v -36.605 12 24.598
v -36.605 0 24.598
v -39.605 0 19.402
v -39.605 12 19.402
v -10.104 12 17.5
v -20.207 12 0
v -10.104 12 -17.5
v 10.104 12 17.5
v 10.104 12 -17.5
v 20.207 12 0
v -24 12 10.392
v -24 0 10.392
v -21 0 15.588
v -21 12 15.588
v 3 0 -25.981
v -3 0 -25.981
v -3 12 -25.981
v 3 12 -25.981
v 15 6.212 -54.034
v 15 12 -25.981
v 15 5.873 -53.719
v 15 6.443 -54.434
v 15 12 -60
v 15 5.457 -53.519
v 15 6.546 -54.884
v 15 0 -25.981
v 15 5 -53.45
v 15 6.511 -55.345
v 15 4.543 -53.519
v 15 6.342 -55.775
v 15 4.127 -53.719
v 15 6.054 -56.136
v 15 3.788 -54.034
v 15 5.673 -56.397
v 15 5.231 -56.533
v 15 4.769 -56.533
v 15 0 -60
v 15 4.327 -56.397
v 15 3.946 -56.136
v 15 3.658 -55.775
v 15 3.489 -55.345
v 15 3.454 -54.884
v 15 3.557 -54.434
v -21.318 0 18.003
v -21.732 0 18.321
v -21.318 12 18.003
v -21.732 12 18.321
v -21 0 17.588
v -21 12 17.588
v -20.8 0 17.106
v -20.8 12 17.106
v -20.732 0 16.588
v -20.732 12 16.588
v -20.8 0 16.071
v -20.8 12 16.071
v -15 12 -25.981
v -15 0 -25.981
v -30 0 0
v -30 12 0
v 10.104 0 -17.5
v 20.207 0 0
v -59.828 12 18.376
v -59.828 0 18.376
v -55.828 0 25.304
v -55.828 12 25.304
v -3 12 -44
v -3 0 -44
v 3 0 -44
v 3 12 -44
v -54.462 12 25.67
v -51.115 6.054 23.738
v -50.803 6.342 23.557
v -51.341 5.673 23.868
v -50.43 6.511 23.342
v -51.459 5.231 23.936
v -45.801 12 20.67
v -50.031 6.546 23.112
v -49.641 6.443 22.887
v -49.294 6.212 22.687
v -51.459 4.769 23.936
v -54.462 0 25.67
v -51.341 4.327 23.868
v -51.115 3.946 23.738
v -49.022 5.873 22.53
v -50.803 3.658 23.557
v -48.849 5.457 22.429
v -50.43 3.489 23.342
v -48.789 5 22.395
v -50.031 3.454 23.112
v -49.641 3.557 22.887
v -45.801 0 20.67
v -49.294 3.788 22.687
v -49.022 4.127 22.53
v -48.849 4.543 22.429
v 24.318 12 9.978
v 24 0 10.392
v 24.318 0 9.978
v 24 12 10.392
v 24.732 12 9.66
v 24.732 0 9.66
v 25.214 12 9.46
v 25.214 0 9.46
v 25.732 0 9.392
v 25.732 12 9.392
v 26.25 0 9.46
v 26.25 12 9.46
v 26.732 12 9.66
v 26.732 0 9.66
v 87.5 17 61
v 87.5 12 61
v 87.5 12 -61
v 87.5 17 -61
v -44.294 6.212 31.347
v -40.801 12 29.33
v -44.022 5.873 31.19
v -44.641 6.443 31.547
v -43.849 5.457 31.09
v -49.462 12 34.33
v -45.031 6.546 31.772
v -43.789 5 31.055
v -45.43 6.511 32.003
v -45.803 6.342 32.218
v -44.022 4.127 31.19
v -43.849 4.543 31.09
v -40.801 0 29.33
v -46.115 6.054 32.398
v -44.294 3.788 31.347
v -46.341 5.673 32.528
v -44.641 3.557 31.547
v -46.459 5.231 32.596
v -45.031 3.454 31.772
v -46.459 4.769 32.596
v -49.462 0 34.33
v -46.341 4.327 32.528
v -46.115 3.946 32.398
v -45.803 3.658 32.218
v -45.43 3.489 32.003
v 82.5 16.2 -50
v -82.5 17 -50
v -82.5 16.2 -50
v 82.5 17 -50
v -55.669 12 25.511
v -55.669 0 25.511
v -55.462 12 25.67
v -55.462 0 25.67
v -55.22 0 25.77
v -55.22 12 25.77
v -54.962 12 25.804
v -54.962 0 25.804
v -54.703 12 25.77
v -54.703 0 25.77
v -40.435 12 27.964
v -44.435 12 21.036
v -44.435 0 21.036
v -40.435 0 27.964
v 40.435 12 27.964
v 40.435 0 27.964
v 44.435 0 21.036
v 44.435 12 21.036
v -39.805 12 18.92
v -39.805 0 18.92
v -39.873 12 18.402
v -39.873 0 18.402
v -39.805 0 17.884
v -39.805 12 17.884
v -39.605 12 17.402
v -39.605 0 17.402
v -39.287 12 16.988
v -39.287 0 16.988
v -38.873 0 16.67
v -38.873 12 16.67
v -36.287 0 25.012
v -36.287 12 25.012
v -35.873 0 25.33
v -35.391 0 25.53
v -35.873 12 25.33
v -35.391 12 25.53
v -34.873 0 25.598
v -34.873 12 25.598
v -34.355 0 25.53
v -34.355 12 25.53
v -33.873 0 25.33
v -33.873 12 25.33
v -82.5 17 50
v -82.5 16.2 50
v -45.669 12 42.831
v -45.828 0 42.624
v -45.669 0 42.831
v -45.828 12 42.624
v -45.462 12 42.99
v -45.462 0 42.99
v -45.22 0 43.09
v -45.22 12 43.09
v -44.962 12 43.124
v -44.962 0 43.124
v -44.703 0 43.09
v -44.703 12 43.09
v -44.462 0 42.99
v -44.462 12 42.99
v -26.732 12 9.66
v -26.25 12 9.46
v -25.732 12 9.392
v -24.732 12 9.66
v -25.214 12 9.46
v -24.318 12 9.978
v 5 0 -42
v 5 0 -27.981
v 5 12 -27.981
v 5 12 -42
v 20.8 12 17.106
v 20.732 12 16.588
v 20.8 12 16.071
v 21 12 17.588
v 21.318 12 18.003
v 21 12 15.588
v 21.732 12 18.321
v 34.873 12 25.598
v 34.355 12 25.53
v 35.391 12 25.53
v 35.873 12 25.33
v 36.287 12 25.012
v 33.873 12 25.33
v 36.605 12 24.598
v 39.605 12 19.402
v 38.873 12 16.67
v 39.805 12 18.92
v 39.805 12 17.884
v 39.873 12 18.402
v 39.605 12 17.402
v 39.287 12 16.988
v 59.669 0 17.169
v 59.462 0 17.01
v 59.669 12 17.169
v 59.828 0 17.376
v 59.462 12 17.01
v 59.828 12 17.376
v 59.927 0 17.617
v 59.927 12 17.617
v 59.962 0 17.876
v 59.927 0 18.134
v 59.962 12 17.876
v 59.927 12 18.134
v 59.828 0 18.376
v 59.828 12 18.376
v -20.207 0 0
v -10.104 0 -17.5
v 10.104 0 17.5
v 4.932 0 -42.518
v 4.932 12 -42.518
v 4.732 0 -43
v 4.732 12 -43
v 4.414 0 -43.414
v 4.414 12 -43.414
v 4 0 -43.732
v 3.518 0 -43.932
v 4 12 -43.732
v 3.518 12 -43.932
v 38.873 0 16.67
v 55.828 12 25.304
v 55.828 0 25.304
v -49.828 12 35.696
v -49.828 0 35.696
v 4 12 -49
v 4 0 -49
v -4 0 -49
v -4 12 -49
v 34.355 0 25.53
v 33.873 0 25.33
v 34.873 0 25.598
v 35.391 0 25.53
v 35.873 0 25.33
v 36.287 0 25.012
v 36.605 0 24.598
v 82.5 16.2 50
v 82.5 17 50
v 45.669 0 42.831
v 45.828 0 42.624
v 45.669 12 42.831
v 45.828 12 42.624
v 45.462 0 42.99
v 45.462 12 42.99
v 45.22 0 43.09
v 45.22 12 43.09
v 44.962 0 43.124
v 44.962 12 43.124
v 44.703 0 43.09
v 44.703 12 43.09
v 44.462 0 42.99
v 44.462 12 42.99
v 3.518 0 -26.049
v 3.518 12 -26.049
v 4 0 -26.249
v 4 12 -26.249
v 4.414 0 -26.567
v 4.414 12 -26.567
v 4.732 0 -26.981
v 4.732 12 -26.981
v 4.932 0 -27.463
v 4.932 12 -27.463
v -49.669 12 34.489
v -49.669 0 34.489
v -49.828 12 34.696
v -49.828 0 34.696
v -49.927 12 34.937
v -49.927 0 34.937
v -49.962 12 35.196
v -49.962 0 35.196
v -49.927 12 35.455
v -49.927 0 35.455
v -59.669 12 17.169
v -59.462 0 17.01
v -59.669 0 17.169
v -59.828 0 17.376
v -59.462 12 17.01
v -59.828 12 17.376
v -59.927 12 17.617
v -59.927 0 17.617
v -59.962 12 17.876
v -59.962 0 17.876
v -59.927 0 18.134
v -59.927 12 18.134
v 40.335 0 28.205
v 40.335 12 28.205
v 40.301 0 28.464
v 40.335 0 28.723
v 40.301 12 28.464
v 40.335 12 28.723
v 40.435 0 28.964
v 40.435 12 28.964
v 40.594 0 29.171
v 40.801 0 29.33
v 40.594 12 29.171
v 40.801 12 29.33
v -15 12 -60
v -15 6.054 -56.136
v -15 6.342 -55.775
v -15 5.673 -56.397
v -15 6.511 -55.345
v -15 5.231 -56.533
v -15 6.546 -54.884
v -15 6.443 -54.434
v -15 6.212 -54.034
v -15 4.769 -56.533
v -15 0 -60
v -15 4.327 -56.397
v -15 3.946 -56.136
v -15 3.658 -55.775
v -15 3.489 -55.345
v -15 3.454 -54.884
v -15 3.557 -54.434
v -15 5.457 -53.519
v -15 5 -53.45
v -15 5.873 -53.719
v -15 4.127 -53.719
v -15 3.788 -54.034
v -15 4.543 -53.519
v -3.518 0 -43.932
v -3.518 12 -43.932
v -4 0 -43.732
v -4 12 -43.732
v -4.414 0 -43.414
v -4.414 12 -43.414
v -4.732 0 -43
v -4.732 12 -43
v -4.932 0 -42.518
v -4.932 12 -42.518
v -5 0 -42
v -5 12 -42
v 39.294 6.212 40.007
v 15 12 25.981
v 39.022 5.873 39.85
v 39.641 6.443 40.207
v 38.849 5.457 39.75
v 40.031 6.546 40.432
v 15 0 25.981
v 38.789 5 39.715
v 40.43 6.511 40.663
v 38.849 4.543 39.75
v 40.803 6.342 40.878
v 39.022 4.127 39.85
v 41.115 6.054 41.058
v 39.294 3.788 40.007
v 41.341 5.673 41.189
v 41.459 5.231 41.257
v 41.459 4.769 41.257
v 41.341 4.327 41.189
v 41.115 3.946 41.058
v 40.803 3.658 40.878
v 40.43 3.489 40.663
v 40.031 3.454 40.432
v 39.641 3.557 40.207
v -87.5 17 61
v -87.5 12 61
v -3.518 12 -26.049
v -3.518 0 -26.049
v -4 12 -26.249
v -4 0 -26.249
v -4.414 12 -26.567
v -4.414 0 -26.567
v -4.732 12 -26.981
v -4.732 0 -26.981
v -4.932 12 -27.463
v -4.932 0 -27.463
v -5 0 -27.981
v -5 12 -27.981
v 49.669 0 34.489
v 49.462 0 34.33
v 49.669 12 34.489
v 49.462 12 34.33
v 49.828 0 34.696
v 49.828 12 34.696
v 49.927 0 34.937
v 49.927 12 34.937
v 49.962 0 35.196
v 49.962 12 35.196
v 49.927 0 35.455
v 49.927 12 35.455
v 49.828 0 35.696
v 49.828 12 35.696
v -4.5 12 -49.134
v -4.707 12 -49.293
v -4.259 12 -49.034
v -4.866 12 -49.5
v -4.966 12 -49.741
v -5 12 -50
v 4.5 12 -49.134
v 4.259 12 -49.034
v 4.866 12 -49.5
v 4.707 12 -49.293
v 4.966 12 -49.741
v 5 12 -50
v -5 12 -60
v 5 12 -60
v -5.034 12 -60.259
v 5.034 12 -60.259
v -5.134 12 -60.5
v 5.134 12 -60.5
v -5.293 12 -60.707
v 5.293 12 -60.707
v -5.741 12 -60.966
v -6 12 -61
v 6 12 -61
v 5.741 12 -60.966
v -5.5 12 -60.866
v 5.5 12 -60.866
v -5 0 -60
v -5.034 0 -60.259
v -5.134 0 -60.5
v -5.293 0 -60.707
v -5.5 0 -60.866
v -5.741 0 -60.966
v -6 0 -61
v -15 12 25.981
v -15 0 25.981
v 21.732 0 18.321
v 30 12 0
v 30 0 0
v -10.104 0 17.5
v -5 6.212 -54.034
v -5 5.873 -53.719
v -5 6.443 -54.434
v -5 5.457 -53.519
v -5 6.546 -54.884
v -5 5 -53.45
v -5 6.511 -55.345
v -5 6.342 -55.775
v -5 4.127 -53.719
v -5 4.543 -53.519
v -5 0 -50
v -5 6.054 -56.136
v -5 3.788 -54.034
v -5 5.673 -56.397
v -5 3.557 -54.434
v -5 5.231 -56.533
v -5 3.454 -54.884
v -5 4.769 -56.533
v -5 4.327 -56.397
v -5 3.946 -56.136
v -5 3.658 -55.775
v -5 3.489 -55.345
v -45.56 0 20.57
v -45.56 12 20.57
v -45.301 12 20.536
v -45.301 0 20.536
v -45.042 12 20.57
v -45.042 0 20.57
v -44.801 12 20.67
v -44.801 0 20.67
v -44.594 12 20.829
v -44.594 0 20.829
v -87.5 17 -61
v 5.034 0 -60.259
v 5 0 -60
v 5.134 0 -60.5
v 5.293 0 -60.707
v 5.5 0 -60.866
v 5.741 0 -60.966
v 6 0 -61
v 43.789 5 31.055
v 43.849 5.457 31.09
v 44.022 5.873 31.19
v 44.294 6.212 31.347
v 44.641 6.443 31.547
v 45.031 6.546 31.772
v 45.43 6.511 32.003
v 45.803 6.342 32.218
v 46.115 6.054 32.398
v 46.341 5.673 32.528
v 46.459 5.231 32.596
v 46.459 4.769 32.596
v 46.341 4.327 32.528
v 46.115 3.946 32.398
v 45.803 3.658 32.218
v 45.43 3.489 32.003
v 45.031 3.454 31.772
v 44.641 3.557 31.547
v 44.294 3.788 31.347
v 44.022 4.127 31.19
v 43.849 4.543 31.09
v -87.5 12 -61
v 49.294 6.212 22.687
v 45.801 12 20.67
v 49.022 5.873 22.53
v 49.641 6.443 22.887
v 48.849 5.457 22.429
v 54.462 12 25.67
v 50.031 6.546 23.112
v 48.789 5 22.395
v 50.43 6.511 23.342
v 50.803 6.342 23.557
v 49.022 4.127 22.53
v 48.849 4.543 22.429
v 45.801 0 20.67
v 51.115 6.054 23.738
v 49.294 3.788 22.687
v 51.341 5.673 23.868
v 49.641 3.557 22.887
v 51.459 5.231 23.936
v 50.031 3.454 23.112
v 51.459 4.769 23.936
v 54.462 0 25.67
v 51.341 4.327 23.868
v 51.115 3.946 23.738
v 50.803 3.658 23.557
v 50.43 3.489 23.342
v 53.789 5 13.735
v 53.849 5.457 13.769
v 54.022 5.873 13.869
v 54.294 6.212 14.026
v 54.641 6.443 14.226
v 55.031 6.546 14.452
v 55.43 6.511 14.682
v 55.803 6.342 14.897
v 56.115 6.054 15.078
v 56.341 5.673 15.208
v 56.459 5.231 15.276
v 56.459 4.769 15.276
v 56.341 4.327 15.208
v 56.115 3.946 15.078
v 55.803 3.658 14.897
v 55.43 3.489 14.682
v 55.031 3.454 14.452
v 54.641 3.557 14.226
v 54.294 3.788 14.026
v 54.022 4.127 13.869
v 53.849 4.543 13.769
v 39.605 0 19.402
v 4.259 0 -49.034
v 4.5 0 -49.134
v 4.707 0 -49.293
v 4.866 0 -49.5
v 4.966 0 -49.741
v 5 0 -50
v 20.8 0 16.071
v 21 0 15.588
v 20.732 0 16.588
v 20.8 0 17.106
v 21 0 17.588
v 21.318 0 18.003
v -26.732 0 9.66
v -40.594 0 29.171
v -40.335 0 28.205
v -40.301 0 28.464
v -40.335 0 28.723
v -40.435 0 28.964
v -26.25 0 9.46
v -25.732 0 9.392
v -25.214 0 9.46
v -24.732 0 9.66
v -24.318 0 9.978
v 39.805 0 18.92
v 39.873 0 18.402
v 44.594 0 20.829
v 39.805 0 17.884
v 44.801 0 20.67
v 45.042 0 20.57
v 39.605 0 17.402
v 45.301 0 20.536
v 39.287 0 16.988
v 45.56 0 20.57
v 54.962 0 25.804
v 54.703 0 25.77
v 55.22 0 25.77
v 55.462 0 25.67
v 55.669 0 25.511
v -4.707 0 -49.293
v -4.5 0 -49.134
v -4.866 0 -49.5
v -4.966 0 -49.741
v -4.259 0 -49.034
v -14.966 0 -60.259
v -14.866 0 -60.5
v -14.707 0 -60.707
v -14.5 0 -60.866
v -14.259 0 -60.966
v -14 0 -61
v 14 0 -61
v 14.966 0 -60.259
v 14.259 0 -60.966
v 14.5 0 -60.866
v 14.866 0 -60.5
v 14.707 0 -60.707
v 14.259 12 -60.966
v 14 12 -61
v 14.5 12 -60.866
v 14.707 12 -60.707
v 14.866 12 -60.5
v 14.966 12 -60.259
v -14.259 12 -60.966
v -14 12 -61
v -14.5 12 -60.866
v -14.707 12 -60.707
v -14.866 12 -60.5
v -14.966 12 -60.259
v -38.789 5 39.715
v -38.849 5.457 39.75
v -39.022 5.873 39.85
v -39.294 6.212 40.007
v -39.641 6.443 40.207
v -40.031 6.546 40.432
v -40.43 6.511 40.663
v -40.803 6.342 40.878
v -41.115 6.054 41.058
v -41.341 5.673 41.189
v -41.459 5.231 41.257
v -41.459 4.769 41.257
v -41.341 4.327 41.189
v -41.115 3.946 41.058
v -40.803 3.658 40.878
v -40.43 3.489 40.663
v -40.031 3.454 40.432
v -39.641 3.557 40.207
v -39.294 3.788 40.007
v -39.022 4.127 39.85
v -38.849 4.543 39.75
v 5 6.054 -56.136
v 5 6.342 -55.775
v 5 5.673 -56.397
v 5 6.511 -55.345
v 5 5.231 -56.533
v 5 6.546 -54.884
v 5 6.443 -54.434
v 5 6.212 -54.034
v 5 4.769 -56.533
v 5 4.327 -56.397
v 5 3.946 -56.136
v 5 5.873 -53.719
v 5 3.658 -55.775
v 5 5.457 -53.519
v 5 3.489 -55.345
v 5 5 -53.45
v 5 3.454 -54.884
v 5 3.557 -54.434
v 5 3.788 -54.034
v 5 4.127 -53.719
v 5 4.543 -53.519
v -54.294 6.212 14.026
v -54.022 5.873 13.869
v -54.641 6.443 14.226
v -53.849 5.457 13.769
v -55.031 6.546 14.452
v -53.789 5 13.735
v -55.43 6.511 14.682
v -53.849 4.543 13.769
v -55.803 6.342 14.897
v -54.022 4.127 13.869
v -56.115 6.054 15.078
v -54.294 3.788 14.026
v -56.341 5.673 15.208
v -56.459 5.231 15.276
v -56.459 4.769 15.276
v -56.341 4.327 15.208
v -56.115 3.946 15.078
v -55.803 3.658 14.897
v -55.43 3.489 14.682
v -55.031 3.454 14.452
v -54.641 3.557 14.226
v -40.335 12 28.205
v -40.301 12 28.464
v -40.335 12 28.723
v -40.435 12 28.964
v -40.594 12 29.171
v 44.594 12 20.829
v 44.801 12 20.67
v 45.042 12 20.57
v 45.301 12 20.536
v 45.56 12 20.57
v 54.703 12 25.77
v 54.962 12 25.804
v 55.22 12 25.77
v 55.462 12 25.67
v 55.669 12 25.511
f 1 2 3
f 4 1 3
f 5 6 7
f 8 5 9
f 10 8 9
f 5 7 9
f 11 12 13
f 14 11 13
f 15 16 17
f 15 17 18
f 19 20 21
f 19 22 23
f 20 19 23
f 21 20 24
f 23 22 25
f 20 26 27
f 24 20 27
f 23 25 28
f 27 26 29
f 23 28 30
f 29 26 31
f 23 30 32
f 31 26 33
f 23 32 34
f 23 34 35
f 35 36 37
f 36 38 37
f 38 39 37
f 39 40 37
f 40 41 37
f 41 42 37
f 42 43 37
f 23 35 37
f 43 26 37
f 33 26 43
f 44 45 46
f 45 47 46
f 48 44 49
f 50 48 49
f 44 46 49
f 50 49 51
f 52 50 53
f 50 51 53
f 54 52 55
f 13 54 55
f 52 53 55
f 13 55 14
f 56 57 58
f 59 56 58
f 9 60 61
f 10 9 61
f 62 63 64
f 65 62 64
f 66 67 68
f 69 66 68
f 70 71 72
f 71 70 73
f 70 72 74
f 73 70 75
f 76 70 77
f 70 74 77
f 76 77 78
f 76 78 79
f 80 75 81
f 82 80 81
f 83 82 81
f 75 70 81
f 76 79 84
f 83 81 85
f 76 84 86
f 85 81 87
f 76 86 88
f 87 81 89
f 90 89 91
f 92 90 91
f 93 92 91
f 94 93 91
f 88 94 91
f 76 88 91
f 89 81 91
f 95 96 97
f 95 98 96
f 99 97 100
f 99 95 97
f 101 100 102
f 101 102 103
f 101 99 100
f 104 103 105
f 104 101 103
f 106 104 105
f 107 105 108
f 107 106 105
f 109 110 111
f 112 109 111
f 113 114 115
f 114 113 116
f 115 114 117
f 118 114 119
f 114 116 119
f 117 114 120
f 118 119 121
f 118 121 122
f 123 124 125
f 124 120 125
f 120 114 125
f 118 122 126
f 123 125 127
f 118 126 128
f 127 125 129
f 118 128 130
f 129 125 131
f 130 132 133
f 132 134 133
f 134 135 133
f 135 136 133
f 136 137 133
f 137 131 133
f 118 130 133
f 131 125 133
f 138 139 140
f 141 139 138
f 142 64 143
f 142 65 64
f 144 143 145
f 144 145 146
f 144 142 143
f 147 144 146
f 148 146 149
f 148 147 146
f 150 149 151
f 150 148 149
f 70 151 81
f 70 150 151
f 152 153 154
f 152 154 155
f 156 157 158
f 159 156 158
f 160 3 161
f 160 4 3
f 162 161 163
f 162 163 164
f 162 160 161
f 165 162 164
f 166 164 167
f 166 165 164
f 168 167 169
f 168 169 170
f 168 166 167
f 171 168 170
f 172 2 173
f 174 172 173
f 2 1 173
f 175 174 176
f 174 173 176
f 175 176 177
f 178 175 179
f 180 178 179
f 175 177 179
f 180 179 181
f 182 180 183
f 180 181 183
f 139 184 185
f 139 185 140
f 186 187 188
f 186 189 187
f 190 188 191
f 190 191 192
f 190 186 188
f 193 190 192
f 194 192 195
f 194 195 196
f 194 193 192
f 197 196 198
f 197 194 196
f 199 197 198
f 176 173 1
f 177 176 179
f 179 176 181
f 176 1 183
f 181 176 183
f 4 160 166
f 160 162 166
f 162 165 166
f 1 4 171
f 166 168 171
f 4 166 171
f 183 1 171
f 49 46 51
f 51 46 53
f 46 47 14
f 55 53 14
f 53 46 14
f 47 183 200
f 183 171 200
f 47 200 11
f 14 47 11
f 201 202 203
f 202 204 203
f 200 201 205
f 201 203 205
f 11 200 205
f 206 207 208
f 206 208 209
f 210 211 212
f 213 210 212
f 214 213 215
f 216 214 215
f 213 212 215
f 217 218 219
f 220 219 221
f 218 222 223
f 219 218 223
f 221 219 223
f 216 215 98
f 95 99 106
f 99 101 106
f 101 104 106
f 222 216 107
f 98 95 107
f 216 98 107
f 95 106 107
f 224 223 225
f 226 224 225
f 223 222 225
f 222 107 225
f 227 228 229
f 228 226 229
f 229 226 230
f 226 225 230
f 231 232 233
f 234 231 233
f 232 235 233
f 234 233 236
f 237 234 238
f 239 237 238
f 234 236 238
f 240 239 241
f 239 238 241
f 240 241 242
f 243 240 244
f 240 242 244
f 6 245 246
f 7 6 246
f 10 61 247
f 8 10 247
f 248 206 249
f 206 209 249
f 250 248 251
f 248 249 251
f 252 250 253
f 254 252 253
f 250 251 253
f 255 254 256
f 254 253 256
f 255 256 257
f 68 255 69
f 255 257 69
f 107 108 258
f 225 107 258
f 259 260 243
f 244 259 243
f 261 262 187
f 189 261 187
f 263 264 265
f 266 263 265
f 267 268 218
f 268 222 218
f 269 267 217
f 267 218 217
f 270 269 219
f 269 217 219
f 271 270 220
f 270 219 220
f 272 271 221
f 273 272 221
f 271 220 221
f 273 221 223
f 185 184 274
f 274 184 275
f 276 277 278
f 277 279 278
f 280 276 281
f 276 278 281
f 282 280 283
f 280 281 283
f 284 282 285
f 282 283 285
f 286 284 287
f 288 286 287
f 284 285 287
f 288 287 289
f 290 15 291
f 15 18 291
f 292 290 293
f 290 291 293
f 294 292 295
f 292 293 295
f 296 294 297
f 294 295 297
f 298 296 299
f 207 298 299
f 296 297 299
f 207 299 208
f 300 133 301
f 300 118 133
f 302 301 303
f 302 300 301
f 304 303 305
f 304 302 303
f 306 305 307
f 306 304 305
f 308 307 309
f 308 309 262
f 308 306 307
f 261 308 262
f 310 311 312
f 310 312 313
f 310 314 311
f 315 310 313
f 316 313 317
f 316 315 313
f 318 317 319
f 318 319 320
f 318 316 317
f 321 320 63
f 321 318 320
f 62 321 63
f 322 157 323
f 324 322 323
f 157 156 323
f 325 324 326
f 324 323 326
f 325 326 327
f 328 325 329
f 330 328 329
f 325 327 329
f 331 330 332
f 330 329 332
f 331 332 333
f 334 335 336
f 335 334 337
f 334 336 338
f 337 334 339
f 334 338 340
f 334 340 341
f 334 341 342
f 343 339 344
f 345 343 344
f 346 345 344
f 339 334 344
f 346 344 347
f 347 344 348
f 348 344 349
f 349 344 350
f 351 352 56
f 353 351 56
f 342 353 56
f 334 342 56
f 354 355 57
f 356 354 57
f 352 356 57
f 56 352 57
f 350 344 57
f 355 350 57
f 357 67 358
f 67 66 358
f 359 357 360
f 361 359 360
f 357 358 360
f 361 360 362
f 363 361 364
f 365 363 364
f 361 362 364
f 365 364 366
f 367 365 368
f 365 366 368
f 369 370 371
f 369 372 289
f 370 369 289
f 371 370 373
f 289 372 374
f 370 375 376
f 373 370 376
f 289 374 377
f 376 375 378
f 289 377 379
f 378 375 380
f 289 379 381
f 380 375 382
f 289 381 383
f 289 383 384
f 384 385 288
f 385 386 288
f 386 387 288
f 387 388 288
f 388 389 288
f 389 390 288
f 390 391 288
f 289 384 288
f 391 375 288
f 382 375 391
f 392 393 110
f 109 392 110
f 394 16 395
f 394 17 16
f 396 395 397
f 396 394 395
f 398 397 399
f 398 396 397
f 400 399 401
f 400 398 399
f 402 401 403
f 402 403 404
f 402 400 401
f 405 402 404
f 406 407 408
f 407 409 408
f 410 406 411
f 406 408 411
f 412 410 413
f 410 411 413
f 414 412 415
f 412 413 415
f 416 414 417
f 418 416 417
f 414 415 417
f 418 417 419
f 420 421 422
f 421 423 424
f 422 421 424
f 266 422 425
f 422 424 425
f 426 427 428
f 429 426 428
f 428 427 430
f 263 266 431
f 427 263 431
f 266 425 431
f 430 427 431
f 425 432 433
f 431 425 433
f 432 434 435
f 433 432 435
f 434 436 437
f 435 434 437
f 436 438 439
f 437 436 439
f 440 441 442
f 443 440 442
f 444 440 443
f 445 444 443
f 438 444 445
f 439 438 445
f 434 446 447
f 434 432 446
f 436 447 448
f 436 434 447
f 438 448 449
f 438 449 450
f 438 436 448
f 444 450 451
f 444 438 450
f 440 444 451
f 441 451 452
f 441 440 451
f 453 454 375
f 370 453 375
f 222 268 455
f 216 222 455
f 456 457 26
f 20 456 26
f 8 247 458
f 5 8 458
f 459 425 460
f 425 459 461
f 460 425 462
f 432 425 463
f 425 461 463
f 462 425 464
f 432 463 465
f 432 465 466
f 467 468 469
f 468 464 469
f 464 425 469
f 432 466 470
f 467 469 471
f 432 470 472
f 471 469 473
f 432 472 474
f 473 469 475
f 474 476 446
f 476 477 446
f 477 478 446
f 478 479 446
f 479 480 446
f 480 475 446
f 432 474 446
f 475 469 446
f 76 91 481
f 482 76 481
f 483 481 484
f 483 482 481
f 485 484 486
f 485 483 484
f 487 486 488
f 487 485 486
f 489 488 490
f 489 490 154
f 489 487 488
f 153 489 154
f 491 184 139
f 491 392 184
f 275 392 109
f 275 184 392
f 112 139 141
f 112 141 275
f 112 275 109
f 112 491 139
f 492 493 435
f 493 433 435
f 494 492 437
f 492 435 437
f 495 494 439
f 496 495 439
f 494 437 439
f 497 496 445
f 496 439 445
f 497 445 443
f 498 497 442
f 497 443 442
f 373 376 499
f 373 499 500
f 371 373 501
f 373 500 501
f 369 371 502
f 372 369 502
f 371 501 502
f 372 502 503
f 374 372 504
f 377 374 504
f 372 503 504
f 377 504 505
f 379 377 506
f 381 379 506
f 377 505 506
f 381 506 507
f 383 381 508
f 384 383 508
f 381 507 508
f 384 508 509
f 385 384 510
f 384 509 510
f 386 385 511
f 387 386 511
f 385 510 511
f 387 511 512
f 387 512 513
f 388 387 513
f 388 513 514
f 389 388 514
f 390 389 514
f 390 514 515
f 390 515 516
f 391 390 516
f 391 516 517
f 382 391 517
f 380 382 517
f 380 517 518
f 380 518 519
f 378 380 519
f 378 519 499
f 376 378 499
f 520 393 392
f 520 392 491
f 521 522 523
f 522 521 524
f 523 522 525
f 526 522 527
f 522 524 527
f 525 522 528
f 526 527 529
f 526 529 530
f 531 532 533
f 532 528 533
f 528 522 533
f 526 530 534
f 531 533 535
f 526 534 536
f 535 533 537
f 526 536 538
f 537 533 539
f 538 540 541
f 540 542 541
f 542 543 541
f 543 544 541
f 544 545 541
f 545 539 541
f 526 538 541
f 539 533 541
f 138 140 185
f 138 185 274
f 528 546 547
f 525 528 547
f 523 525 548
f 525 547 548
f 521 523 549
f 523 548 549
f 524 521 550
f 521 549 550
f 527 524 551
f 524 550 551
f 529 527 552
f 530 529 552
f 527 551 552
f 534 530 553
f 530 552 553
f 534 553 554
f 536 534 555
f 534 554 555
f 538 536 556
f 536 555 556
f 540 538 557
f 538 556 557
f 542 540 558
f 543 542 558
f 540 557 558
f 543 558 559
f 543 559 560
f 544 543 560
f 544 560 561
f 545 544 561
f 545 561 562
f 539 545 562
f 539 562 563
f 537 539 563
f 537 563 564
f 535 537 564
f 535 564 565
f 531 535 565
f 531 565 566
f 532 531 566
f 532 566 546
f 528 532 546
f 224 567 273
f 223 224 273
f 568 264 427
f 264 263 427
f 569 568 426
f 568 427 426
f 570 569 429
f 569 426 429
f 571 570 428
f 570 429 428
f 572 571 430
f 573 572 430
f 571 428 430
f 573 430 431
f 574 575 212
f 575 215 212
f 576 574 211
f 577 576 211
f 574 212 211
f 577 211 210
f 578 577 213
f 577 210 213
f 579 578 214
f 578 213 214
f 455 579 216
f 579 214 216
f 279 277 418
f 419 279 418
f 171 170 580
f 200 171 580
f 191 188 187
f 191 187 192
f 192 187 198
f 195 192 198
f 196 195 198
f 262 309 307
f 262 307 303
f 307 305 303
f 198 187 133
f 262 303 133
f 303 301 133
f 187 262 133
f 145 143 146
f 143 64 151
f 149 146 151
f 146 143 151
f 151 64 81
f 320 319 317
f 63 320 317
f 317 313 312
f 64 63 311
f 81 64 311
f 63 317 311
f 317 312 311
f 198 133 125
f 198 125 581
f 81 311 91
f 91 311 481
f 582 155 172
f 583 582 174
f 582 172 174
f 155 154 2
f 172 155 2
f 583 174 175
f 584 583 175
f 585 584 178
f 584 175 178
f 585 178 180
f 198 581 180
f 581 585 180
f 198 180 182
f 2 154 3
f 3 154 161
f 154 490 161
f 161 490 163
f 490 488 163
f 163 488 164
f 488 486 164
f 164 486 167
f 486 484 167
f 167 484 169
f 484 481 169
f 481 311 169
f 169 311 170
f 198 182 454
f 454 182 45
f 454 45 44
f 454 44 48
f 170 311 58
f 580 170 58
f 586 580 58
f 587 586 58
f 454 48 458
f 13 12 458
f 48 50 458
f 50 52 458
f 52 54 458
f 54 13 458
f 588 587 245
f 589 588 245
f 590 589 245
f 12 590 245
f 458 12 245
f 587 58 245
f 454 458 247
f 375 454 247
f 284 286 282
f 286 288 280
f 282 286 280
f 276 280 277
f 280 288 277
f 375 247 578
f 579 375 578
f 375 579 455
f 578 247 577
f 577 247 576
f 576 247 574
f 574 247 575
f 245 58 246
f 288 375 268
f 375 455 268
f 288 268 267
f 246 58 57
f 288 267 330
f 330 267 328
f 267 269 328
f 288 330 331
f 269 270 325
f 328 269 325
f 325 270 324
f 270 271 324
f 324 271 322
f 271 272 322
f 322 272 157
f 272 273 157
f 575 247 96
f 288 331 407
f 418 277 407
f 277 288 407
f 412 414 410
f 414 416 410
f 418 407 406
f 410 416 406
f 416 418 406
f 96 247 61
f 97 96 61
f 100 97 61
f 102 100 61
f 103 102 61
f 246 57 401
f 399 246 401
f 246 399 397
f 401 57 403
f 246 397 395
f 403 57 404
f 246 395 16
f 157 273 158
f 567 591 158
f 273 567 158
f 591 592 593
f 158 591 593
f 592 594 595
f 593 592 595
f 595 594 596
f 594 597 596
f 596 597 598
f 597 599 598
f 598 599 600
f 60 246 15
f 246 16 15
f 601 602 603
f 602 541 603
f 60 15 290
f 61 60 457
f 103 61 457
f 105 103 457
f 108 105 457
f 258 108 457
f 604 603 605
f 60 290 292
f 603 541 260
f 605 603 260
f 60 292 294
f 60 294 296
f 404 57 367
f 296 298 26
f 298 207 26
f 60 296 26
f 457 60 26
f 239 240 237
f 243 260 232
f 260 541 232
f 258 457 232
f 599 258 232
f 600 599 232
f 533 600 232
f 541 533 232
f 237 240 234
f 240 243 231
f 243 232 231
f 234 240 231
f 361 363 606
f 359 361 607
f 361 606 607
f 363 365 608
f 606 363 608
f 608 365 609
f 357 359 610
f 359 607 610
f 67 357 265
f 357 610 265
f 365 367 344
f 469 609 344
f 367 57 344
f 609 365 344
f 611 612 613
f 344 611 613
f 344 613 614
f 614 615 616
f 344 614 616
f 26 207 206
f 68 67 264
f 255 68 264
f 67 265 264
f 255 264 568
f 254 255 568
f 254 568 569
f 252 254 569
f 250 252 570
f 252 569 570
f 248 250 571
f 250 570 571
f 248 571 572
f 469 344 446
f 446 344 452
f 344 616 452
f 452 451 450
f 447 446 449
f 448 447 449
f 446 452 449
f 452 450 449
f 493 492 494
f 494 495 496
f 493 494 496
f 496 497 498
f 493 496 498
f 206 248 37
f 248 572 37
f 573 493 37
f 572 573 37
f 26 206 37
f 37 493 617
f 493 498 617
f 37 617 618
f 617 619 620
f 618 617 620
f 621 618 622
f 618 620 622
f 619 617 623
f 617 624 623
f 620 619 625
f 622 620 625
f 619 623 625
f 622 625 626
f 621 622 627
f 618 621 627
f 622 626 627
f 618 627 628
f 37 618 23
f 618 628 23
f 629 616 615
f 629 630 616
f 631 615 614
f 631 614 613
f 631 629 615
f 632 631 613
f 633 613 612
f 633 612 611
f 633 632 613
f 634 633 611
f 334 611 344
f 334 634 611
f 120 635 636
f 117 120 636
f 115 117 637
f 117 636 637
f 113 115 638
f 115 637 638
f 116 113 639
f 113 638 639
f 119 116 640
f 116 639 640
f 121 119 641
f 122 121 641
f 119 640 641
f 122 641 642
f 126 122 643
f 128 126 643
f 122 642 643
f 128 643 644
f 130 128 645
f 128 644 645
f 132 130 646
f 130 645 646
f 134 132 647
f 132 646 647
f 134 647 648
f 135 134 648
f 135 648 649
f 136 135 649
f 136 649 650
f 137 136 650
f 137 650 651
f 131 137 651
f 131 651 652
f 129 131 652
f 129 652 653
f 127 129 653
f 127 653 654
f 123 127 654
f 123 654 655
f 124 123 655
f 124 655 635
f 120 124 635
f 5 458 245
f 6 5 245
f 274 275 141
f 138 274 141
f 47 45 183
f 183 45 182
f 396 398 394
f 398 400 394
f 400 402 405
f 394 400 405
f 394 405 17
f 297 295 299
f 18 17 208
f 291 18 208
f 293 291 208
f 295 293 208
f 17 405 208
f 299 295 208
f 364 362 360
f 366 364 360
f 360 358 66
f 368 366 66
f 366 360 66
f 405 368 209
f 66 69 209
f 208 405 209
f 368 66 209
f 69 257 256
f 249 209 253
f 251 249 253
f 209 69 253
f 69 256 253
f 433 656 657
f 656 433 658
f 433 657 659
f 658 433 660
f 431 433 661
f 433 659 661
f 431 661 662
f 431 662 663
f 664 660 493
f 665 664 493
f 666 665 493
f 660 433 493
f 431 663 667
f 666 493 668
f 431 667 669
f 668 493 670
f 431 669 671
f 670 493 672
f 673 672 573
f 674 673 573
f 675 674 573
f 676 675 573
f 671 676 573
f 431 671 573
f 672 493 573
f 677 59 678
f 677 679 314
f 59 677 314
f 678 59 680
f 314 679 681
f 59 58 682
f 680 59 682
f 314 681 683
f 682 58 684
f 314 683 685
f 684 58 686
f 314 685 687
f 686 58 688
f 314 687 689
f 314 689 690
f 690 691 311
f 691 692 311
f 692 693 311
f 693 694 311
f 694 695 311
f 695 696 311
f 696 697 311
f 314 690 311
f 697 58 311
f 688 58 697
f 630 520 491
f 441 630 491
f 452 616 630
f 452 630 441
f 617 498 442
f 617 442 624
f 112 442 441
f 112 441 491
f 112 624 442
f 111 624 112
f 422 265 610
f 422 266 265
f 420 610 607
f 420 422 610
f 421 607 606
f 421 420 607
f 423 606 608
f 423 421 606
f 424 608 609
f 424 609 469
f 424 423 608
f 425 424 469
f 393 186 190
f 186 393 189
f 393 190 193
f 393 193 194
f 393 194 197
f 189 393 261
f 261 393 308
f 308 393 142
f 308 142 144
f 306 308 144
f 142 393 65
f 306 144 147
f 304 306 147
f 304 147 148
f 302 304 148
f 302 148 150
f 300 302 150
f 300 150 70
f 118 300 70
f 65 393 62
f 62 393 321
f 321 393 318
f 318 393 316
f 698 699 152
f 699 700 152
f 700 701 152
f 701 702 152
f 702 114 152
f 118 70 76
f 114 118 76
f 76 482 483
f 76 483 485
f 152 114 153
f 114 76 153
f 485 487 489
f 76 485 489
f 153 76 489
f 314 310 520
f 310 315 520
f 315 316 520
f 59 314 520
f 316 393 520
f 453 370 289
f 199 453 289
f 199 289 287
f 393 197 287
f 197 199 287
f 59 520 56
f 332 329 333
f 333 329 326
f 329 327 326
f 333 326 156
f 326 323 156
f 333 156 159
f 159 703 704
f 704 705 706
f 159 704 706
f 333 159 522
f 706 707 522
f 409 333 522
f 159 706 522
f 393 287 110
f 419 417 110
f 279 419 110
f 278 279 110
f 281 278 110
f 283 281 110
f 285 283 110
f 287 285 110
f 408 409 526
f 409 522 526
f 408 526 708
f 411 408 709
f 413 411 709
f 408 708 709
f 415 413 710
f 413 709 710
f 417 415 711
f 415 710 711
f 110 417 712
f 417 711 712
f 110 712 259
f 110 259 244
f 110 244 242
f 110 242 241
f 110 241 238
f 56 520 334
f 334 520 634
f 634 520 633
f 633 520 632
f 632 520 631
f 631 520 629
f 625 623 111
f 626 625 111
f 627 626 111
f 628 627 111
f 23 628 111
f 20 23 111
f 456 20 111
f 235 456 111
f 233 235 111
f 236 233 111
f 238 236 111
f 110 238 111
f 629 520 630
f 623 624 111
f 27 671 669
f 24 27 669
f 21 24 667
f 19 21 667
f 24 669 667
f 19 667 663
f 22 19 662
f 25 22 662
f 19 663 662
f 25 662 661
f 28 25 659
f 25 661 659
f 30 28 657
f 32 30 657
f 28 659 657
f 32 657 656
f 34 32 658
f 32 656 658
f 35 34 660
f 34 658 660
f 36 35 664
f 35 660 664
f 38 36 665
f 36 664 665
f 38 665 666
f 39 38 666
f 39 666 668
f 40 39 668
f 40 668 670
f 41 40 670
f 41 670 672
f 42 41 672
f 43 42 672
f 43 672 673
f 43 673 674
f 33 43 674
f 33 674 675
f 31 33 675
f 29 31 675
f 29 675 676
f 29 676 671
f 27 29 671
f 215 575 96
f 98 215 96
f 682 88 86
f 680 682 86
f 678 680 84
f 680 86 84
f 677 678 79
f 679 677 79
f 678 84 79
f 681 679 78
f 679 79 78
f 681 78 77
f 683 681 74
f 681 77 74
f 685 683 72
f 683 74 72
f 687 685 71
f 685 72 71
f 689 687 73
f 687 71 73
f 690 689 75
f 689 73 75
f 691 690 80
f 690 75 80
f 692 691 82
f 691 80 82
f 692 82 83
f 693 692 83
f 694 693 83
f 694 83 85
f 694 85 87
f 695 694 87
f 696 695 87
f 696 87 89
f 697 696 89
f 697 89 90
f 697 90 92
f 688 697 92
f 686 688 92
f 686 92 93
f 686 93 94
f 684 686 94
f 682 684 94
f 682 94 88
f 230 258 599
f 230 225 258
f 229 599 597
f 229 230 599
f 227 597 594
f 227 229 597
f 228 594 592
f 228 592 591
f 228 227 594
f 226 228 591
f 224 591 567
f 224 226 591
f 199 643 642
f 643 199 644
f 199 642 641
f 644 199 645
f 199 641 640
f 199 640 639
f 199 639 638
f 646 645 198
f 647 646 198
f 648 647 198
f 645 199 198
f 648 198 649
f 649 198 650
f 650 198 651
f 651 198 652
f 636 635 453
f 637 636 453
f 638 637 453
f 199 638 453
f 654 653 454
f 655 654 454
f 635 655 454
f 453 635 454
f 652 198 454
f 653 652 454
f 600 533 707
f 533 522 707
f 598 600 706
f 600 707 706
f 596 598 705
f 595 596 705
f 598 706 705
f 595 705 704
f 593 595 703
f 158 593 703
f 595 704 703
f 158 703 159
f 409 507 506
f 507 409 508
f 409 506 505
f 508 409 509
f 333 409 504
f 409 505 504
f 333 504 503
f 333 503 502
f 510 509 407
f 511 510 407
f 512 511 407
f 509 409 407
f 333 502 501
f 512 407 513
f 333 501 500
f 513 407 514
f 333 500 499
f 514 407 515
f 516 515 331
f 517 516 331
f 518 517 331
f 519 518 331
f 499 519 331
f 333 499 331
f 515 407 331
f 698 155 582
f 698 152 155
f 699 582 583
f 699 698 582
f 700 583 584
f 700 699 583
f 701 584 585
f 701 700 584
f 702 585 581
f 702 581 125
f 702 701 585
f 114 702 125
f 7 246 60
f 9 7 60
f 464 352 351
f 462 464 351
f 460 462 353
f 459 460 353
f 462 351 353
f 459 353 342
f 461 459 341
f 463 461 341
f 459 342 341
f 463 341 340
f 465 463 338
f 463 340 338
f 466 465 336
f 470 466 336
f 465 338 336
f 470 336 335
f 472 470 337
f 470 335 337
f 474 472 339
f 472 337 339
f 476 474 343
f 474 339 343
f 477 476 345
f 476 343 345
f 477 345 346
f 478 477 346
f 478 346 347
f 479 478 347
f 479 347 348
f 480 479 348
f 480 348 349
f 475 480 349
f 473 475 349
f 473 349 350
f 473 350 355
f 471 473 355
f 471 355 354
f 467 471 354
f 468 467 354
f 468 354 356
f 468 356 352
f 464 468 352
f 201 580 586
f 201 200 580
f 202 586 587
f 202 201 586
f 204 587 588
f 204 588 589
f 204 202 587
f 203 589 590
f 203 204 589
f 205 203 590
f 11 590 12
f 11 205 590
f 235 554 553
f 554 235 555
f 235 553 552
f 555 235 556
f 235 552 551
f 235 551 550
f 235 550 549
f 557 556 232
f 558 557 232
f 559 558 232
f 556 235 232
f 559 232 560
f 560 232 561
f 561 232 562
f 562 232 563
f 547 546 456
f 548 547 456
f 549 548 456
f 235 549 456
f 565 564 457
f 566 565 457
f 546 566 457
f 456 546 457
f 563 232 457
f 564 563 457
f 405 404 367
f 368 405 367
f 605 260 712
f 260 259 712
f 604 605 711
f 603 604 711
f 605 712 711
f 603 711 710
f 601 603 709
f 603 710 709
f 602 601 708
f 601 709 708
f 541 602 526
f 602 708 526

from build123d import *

# Parameters (mm, degrees)
CROQUIS1_W              = 10
CROQUIS1_H              = 18.019237886
SALIENTE_EXTRUIR1_DEPTH = 12
CORTAR_EXTRUIR1_REACH   = 99.669
CROQUIS2_R              = 1.55
CORTAR_EXTRUIR2_REACH   = 103.09
CROQUIS3_R              = 1.55
CORTAR_EXTRUIR3_REACH   = 91.077
CROQUIS4_R              = 1.55
CROQUIS6_W              = 175
CROQUIS6_H              = 122
SALIENTE_EXTRUIR7_DEPTH = 5
REDONDEO1_R             = 2
REDONDEO2_R             = 1
CROQUIS7_W              = 165
CROQUIS7_H              = 100
CORTAR_EXTRUIR4_DEPTH   = 0.8


with BuildPart() as part:
    # Croquis1 → Saliente-Extruir1 (new body)
    with BuildSketch(Plane(origin=(0, 0, 0), x_dir=(1, 0, 0), z_dir=(0, 1, 0))):
        Polygon((5, 49), (-5, 49), (-5, 61), (-15, 61), (-15, 25.980762114), (-30, 0), (-60.327549631, -17.509618943), (-55.327549631, -26.169872981), (-44.935244785, -20.169872981), (-39.935244785, -28.830127019), (-50.327549631, -34.830127019), (-45.327549631, -43.490381057), (-15, -25.980762114), (15, -25.980762114), (45.327549631, -43.490381057), (50.327549631, -34.830127019), (39.935244785, -28.830127019), (44.935244785, -20.169872981), (55.327549631, -26.169872981), (60.327549631, -17.509618943), (30, 0), (15, 25.980762114), (15, 61), (5, 61), align=None)
        Polygon((-40.605117767, -17.669872981), (-25, -8.660254038), (-20, -17.320508076), (-35.605117767, -26.330127019), align=None, mode=Mode.SUBTRACT)
        Polygon((10.103629711, 17.5), (20.207259422, 0), (10.103629711, -17.5), (-10.103629711, -17.5), (-20.207259422, 0), (-10.103629711, 17.5), align=None, mode=Mode.SUBTRACT)
        Polygon((25, -8.660254038), (40.605117767, -17.669872981), (35.605117767, -26.330127019), (20, -17.320508076), align=None, mode=Mode.SUBTRACT)
        with Locations((0, 34.990381057)):
            Rectangle(CROQUIS1_W, CROQUIS1_H, mode=Mode.SUBTRACT)
    extrude(amount=SALIENTE_EXTRUIR1_DEPTH)

    # Cortar-Extruir1: up to this face of the body (flat: up to its plane)
    cortar_extruir1_end = Plane(part.part.faces().sort_by_distance((15, 6, -43.490381057))[0])
    # Croquis2 → Cortar-Extruir1 (cut, up to the picked face)
    with BuildSketch(Plane.ZY.offset(15), mode=Mode.PRIVATE) as cortar_extruir1_sk1:
        with Locations((-55, 5)):
            Circle(CROQUIS2_R)
    cortar_extruir1_tool1 = split(extrude(cortar_extruir1_sk1.sketch, amount=-CORTAR_EXTRUIR1_REACH, mode=Mode.PRIVATE), bisect_by=cortar_extruir1_end, keep=Keep.BOTH, mode=Mode.PRIVATE)
    add(cortar_extruir1_tool1.solids().sort_by(Axis((-15, 5, -55), (1, 0, 0)))[0], mode=Mode.SUBTRACT)

    # Cortar-Extruir2: up to this face of the body (flat: up to its plane)
    cortar_extruir2_end = Plane(part.part.faces().sort_by_distance((-45.163774815, 6, 8.754809472))[0])
    # Croquis3 → Cortar-Extruir2 (cut, up to the picked face)
    with BuildSketch(Plane(origin=(7.5, 0, 12.990381057), x_dir=(0.8660254037844382, 0, -0.5000000000000007), z_dir=(0.5000000000000008, 0, 0.8660254037844383)), mode=Mode.PRIVATE) as cortar_extruir2_sk1:
        with Locations((-55, 5)):
            Circle(CROQUIS3_R)
    cortar_extruir2_tool1 = split(extrude(cortar_extruir2_sk1.sketch, amount=-CORTAR_EXTRUIR2_REACH, mode=Mode.PRIVATE), bisect_by=cortar_extruir2_end, keep=Keep.BOTH, mode=Mode.PRIVATE)
    add(cortar_extruir2_tool1.solids().sort_by(Axis((-40.131397, 5, 40.490381), (-0.5000000000000008, 0, -0.8660254037844383)))[0], mode=Mode.SUBTRACT)

    # Cortar-Extruir3: up to this face of the body (flat: up to its plane)
    cortar_extruir3_end = Plane(part.part.faces().sort_by_distance((30.163774815, 6, 34.735571585))[0])
    # Croquis4 → Cortar-Extruir3 (cut, up to the picked face)
    with BuildSketch(Plane(origin=(7.5, 0, -12.990381057), x_dir=(-0.8660254037844407, 0, -0.4999999999999965), z_dir=(0.49999999999999656, 0, -0.8660254037844407)), mode=Mode.PRIVATE) as cortar_extruir3_sk1:
        with Locations((-55, 5)):
            Circle(CROQUIS4_R)
    cortar_extruir3_tool1 = split(extrude(cortar_extruir3_sk1.sketch, amount=-CORTAR_EXTRUIR3_REACH, mode=Mode.PRIVATE), bisect_by=cortar_extruir3_end, keep=Keep.BOTH, mode=Mode.PRIVATE)
    add(cortar_extruir3_tool1.solids().sort_by(Axis((55.131397, 5, 14.509619), (-0.49999999999999656, 0, 0.8660254037844407)))[0], mode=Mode.SUBTRACT)

    # Croquis6 → Saliente-Extruir7 (add)
    with BuildSketch(Plane(origin=(0, 12, 0), x_dir=(1, 0, 0), z_dir=(0, 1, 0))):
        Rectangle(CROQUIS6_W, CROQUIS6_H)
    extrude(amount=SALIENTE_EXTRUIR7_DEPTH)

    # Redondeo1
    redondeo1_edges = [part.edges().sort_by_distance(p)[0] for p in [
        (35.605117767, 6, 26.330127019),
        (40.605117767, 6, 17.669872981),
        (25, 6, 8.660254038),
        (20, 6, 17.320508076),
        (-35.605117767, 6, 26.330127019),
        (-20, 6, 17.320508076),
        (-25, 6, 8.660254038),
        (-40.605117767, 6, 17.669872981),
        (-5, 6, -25.980762114),
        (5, 6, -25.980762114),
        (5, 6, -44),
        (-5, 6, -44),
    ]]
    fillet(redondeo1_edges, radius=REDONDEO1_R)

    # Redondeo2
    redondeo2_edges = [part.edges().sort_by_distance(p)[0] for p in [
        (-15, 6, -61),
        (-5, 6, -61),
        (-5, 6, -49),
        (5, 6, -49),
        (5, 6, -61),
        (15, 6, -61),
        (60.327549631, 6, 17.509618943),
        (55.327549631, 6, 26.169872981),
        (44.935244785, 6, 20.169872981),
        (39.935244785, 6, 28.830127019),
        (50.327549631, 6, 34.830127019),
        (45.327549631, 6, 43.490381057),
        (-45.327549631, 6, 43.490381057),
        (-50.327549631, 6, 34.830127019),
        (-39.935244785, 6, 28.830127019),
        (-44.935244785, 6, 20.169872981),
        (-55.327549631, 6, 26.169872981),
        (-60.327549631, 6, 17.509618943),
    ]]
    fillet(redondeo2_edges, radius=REDONDEO2_R)

    # Croquis7 → Cortar-Extruir4 (cut)
    with BuildSketch(Plane(origin=(0, 17, 0), x_dir=(1, 0, 0), z_dir=(0, 1, 0))):
        Rectangle(CROQUIS7_W, CROQUIS7_H)
    extrude(amount=-CORTAR_EXTRUIR4_DEPTH, mode=Mode.SUBTRACT)


solid = part.part
